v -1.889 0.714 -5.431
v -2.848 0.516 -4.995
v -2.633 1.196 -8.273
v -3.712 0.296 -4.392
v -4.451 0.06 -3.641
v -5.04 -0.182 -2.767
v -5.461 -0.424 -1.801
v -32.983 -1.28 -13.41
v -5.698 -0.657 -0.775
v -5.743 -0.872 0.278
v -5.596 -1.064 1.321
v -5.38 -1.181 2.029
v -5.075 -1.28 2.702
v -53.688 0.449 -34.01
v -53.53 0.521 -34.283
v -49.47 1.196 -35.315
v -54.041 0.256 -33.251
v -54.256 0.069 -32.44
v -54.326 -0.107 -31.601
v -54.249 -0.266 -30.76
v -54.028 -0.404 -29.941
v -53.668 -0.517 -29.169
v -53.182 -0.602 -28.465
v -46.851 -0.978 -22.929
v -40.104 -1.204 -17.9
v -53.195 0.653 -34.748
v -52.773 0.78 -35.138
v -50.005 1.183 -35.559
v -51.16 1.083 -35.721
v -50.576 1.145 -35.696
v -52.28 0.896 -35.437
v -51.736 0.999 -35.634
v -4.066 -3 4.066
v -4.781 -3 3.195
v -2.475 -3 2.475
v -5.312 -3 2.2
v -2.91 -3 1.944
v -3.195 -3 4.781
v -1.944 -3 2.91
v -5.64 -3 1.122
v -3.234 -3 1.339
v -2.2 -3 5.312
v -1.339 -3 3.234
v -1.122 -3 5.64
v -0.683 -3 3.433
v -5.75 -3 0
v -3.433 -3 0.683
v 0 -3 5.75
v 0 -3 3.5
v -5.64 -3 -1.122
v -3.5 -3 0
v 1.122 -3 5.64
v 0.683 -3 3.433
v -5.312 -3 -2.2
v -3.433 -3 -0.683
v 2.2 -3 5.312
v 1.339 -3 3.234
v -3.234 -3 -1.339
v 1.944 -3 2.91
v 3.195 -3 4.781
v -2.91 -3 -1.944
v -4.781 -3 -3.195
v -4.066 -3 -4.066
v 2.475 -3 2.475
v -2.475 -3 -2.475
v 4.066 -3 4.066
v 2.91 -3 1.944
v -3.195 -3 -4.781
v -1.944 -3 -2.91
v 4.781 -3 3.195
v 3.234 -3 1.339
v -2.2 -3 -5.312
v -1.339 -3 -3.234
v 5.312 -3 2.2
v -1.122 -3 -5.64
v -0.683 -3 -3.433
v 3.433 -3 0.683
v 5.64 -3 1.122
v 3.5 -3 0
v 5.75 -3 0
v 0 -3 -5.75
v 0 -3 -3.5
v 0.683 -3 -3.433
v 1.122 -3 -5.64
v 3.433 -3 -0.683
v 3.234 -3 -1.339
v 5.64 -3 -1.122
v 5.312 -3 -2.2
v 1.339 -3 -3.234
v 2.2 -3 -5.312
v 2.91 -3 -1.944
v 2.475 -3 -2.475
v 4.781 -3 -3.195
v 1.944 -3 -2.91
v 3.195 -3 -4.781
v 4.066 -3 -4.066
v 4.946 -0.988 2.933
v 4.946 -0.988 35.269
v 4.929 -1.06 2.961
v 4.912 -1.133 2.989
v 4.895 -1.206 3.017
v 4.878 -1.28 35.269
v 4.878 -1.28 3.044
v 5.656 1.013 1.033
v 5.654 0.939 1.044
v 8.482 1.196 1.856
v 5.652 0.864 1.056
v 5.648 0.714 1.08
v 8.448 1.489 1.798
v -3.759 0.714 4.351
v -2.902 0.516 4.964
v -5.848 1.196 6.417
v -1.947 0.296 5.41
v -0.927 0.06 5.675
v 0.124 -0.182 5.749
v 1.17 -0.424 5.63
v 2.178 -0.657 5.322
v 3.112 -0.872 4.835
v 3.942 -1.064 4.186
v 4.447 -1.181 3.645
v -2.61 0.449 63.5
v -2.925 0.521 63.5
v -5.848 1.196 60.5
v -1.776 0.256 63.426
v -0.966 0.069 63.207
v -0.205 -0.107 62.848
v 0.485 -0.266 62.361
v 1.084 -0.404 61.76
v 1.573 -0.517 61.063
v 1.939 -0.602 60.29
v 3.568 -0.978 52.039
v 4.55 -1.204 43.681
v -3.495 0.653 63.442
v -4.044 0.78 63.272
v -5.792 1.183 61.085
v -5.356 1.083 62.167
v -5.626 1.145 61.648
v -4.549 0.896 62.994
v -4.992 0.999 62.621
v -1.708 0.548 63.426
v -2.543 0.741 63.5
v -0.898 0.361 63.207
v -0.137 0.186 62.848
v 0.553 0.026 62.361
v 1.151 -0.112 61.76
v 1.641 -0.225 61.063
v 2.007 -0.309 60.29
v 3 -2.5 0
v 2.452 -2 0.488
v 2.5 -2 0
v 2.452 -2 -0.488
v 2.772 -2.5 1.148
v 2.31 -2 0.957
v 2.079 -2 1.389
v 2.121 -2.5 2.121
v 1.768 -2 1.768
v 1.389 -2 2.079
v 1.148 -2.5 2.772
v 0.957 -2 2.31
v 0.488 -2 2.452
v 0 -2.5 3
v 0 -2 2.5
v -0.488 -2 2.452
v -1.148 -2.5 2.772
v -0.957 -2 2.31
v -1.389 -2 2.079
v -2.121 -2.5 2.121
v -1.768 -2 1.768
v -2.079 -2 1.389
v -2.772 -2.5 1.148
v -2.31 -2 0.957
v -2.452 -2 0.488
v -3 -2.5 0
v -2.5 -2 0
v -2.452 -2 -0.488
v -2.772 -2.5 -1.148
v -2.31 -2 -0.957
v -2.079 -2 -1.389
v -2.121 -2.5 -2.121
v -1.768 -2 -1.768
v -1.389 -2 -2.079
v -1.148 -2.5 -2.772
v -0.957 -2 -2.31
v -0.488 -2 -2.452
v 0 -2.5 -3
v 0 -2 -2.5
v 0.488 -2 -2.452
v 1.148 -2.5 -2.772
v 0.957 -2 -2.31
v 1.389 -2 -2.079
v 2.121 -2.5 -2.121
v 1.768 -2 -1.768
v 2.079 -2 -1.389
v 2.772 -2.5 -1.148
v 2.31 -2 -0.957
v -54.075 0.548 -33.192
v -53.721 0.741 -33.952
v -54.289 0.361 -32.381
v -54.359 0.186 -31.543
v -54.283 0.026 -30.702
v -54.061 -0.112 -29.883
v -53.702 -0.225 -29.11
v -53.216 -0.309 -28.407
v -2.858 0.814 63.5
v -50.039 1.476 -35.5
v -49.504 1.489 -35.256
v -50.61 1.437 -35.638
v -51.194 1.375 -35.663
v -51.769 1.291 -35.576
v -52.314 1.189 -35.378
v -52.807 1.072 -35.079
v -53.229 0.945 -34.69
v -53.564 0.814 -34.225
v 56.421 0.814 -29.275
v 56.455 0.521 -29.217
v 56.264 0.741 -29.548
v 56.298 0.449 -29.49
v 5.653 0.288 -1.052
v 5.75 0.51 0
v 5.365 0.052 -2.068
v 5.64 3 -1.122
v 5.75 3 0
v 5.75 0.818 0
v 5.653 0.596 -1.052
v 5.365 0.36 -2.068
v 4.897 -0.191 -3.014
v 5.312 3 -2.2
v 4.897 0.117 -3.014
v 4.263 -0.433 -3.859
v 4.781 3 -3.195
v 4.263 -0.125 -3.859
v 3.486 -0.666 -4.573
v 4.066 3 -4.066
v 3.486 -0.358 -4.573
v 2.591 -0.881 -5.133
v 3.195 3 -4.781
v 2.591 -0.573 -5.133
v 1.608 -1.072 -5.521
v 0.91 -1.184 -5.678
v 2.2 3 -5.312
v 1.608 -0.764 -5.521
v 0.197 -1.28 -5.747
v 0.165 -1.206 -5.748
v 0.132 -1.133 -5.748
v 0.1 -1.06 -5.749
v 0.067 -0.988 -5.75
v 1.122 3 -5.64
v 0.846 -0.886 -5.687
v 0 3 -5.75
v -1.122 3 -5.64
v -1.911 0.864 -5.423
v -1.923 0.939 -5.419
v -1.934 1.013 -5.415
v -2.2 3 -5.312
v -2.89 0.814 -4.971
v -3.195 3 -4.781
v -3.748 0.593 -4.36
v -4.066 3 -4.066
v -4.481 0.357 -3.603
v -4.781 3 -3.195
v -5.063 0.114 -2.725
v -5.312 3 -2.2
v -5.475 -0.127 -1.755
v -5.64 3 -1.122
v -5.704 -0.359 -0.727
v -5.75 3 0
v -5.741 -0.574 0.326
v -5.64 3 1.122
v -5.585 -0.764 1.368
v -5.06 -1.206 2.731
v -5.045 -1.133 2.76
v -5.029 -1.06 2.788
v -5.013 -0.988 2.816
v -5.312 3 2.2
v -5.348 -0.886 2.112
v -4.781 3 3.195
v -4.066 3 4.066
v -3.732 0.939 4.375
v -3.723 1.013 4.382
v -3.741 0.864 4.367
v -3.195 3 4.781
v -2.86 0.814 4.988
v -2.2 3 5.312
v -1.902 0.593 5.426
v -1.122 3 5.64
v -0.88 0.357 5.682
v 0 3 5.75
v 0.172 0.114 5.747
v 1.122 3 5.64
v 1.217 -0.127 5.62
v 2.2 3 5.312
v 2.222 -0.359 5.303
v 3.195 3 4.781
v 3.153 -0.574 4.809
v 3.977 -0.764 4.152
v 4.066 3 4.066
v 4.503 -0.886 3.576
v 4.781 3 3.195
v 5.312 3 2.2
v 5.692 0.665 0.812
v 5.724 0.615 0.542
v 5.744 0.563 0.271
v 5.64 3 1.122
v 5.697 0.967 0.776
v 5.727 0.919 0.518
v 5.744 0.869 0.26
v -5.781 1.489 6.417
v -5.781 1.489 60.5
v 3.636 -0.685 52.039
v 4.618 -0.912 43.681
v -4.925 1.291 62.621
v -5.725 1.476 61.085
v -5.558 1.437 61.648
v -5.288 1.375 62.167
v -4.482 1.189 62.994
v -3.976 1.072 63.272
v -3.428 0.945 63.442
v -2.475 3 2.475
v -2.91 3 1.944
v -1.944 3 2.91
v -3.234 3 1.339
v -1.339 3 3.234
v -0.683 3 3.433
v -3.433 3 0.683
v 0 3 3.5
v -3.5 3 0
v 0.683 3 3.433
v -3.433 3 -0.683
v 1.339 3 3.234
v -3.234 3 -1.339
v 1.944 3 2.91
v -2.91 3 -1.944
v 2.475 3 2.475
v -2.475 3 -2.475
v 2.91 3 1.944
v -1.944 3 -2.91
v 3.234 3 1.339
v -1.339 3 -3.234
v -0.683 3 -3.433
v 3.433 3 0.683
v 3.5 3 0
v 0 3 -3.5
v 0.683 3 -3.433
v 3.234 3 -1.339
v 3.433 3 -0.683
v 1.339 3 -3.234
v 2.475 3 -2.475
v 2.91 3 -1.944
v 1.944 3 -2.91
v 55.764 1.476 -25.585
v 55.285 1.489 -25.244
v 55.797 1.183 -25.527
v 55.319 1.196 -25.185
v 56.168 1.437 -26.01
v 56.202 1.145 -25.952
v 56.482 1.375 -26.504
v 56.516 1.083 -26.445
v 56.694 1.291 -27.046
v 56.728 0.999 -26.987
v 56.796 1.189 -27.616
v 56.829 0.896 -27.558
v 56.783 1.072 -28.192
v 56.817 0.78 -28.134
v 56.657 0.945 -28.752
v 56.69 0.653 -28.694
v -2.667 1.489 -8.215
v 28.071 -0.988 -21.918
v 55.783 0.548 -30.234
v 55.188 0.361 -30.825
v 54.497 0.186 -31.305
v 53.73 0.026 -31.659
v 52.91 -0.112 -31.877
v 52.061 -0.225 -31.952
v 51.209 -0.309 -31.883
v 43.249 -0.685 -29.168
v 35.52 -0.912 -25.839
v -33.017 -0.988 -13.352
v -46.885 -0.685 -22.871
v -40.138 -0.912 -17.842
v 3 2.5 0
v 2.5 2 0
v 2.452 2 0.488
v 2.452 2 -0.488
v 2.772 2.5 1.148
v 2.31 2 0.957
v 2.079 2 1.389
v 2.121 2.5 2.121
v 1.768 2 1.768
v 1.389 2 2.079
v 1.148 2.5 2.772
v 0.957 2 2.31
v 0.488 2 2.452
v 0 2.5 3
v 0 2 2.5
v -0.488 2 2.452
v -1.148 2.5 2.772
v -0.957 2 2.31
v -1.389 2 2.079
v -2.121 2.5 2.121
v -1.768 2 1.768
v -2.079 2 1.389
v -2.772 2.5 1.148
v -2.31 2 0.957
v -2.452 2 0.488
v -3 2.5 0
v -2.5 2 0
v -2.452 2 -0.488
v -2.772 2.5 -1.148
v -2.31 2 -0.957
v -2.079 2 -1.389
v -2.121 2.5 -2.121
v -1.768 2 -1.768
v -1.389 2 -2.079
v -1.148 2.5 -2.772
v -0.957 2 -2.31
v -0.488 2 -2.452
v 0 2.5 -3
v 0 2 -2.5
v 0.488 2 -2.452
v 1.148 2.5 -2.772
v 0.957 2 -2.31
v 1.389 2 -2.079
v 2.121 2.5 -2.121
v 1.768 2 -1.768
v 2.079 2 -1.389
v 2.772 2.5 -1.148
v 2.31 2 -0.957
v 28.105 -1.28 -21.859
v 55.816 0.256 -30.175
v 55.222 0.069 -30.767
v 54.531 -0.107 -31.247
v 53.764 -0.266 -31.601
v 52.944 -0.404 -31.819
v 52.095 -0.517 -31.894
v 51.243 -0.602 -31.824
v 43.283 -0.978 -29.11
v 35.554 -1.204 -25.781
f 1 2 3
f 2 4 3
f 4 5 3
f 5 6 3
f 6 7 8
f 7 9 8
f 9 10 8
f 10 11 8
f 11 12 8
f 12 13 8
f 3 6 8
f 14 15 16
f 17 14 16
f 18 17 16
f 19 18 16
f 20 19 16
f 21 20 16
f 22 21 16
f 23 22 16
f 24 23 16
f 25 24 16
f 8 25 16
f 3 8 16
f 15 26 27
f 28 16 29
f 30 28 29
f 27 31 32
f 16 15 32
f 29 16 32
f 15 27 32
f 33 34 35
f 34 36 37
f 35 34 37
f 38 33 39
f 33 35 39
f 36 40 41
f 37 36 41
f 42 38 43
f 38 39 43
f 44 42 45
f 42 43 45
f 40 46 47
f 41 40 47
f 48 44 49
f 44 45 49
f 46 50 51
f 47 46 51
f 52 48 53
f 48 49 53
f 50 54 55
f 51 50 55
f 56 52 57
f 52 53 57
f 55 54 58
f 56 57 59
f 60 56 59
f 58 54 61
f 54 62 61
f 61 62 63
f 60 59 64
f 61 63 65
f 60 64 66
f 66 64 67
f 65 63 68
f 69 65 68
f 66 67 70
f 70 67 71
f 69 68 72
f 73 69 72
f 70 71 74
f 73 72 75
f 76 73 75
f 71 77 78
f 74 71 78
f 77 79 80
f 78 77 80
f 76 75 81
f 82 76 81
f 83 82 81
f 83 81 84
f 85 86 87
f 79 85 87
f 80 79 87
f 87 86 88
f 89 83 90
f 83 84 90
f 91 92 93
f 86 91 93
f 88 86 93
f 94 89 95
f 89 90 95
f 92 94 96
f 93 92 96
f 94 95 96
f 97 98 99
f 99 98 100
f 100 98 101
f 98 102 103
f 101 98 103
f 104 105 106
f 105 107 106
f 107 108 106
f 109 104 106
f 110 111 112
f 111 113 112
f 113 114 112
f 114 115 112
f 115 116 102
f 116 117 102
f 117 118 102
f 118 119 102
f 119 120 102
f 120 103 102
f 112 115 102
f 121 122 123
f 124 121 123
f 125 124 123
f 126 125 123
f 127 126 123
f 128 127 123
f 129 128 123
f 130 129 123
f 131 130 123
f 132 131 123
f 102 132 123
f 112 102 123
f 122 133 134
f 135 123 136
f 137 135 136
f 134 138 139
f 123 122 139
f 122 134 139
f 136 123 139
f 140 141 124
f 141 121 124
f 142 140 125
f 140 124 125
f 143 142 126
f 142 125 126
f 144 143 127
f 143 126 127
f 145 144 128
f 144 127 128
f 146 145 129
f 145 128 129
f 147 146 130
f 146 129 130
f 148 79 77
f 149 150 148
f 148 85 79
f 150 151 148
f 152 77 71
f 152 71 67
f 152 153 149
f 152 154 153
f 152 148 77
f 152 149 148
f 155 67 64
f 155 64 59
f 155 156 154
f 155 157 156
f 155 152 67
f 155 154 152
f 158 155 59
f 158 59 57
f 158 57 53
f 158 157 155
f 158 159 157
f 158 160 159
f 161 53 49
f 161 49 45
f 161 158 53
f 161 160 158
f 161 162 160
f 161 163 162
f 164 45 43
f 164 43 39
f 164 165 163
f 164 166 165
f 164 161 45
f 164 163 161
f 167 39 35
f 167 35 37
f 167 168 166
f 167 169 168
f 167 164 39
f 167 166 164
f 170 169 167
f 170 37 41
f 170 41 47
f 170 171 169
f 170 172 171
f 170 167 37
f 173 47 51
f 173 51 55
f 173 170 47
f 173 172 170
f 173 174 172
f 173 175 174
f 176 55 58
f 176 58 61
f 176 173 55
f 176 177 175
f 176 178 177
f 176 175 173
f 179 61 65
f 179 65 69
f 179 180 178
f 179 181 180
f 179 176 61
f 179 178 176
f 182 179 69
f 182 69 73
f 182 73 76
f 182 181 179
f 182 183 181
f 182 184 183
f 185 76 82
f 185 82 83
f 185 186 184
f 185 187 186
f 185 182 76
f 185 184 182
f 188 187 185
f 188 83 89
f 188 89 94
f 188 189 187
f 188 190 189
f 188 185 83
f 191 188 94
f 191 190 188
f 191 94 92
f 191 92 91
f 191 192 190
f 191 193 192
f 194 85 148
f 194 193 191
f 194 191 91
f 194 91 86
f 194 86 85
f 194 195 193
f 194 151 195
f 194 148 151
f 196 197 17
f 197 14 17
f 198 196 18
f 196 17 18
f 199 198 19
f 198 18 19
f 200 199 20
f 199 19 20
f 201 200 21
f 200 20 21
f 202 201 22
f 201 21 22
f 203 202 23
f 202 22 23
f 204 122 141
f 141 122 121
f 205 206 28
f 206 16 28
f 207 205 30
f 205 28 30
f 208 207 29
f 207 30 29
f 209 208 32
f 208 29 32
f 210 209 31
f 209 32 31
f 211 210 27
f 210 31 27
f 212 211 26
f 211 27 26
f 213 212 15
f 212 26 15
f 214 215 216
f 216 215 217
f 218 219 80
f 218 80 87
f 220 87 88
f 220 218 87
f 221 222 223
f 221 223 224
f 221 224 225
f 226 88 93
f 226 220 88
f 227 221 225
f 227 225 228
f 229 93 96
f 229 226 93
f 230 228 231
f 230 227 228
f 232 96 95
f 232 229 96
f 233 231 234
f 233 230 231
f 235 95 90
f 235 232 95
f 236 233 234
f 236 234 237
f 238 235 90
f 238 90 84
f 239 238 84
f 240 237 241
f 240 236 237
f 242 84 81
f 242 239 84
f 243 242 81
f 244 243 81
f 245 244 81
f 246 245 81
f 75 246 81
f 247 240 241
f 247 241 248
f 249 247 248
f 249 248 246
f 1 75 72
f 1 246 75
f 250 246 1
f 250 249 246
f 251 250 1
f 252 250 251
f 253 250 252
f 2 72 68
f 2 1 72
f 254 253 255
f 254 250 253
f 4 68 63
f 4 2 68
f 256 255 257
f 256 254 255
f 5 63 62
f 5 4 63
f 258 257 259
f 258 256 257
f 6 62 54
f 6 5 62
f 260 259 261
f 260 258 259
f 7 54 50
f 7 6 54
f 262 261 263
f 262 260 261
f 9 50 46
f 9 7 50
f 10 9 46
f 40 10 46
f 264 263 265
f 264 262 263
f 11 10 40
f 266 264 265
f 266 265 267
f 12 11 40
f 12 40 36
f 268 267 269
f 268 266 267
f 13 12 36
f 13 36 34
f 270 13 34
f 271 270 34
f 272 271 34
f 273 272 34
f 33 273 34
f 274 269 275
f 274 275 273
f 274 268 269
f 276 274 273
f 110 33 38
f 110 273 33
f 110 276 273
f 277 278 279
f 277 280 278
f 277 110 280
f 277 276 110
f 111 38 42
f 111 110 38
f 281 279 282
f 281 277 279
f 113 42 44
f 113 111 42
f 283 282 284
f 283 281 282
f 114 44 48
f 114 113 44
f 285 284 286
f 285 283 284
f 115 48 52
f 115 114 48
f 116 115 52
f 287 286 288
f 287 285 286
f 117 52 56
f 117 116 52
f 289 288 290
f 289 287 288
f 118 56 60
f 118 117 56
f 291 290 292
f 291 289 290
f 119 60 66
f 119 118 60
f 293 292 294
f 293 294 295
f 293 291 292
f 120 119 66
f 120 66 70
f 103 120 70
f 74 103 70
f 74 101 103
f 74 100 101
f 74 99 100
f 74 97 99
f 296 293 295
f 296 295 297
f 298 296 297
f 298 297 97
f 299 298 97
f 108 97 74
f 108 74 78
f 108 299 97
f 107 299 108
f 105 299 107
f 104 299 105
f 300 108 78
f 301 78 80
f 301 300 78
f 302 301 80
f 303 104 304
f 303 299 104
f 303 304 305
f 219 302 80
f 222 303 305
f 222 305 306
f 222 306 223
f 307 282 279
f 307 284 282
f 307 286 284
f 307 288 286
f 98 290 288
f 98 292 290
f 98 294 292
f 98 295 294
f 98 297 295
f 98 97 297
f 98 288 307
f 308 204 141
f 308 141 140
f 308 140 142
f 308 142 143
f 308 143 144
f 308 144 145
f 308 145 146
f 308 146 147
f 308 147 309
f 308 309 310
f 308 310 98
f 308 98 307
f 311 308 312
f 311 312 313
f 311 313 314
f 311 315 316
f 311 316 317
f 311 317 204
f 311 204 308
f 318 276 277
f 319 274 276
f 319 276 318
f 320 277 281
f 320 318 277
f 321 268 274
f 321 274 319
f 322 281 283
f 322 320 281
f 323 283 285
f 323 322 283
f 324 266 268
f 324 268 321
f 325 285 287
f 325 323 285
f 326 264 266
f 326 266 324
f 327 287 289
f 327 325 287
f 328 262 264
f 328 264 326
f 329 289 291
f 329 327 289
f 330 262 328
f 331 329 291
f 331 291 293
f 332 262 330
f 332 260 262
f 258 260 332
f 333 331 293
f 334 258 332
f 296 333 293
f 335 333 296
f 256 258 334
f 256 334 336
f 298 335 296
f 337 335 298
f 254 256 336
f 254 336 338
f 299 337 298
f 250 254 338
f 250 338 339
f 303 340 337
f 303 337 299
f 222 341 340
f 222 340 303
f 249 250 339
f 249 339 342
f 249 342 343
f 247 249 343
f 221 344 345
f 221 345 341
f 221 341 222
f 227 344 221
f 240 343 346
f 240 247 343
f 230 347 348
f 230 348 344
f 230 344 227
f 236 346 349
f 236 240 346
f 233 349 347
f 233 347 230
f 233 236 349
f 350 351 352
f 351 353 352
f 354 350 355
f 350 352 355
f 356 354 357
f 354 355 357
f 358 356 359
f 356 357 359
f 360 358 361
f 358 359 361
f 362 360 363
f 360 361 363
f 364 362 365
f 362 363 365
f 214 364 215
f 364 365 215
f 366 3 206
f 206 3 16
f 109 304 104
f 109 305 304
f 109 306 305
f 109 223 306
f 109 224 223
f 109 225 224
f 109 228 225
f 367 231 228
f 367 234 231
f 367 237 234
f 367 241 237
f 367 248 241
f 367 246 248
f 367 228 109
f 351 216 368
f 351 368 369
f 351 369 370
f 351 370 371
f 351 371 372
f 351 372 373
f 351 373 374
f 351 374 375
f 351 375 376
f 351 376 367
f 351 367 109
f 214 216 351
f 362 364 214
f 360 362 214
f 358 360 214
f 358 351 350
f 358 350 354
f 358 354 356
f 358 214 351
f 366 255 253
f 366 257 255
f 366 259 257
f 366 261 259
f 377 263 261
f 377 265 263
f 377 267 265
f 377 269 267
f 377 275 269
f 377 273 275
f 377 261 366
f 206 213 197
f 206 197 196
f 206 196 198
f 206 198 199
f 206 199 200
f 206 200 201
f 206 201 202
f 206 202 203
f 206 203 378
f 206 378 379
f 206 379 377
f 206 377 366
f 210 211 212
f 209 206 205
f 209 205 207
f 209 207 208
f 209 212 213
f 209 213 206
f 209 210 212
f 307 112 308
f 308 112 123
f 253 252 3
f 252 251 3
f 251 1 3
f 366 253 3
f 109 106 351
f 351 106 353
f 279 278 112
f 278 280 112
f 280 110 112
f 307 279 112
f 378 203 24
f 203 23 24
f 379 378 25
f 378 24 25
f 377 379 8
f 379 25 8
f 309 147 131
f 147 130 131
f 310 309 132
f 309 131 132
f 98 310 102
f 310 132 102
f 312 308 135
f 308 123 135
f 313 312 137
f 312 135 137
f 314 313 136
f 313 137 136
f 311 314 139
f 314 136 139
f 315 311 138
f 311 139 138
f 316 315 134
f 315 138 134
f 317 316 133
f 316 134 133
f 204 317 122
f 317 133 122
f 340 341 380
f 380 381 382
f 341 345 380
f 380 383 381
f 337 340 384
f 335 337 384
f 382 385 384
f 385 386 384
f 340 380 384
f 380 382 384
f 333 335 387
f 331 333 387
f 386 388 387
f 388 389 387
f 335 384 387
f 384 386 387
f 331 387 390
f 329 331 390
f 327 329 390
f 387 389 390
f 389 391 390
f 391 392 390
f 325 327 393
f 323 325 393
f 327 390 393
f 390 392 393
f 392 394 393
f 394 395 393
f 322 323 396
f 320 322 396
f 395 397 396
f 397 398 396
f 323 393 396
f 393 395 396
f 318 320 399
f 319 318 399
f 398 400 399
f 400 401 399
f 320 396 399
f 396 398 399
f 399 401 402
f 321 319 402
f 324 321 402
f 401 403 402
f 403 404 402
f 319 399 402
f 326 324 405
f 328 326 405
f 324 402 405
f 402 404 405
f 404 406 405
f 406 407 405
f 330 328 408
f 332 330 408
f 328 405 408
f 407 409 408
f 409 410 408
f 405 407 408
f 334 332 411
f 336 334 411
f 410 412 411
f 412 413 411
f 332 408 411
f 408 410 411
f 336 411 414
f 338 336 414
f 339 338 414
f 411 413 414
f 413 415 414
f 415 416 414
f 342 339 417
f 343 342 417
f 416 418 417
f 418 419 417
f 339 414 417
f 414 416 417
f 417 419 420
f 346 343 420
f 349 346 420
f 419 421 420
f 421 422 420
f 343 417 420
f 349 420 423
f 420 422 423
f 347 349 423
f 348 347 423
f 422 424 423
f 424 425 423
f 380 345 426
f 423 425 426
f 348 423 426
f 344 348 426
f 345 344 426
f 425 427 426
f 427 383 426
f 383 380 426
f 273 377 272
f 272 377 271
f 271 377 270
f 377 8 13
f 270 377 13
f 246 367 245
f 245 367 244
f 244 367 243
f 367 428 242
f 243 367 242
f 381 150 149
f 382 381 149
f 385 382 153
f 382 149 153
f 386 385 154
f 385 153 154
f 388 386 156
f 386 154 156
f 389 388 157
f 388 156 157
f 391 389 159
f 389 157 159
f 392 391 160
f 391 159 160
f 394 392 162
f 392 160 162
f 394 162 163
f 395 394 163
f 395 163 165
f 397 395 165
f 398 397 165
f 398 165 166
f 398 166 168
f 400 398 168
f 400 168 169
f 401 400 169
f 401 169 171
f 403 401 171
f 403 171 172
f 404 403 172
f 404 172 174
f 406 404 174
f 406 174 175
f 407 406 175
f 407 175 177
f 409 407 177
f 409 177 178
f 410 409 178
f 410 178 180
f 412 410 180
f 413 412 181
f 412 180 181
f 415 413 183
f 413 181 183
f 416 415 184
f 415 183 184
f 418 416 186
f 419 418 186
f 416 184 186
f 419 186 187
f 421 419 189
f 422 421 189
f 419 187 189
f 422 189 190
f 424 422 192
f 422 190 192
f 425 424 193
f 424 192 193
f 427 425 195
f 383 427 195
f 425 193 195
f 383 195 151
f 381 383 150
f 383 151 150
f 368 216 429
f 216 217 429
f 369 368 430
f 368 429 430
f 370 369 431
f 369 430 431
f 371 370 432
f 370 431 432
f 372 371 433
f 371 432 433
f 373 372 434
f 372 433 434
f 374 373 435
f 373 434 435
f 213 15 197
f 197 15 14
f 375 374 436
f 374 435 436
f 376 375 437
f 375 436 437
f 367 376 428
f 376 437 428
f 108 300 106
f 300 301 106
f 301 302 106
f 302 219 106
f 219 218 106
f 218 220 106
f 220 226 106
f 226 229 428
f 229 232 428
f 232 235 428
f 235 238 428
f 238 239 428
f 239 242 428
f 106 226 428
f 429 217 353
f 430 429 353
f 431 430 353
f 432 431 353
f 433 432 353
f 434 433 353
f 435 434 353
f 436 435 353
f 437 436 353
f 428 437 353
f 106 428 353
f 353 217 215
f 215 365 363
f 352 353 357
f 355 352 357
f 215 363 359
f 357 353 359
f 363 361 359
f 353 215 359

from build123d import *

# Parameters (mm, degrees)
SKETCH1_R           = 5.75
BOSS_EXTRUDE1_DEPTH = 3
BOSS_EXTRUDE2_DEPTH = 0.15
CIRPATTERN1_COUNT   = 3
SKETCH4_R           = 2.5
CUT_EXTRUDE1_DEPTH  = 7
CHAMFER1_SIZE       = 1


with BuildPart() as part:
    # Sketch1 → Boss-Extrude1 (new body, symmetric)
    with BuildSketch(Plane(origin=(0, 0, 0), x_dir=(1, 0, 0), z_dir=(0, 1, 0))):
        Circle(SKETCH1_R)
    extrude(amount=BOSS_EXTRUDE1_DEPTH, both=True)

    # Sketch3 → Boss-Extrude2 (add, symmetric)
    with BuildSketch(Plane(origin=(0, 0, 0), x_dir=(0.974370065, -0.224951054, 0), z_dir=(-0.224951054, -0.974370065, 0))):
        with BuildLine():
            Line((-3.401230627, 3.94493197), (-5.967495519, 6.417230684))
            Line((-5.967495519, 6.417230684), (-5.967495519, 60.5))
            ThreePointArc((-5.967495519, 60.5), (-5.088815862, 62.621320344), (-2.967495519, 63.5))
            Line((-2.967495519, 63.5), (-2.64407202, 63.5))
            ThreePointArc((-2.64407202, 63.5), (0.188980824, 62.61992859), (2.024718143, 60.289524634))
            ThreePointArc((2.024718143, 60.289524634), (4.284220879, 47.869969205), (5.041015214, 35.26925605))
            Line((5.041015214, 35.26925605), (5.041015214, 1.396310084))
            add(Edge.make_bspline(
                [(-3.401230627, 3.94493197), (1.650654294, 7.536977948), (5.041015214, 1.396310084)],
                knots=[0, 0, 0, 1, 1, 1], degree=2))
        make_face()
    boss_extrude2 = extrude(amount=BOSS_EXTRUDE2_DEPTH, both=True)

    # CirPattern1: Boss-Extrude2 ×3 about axis
    cirpattern1_axis = Axis((0, 0, 0), (0, 1, 0))
    for i in range(1, CIRPATTERN1_COUNT):
        add(boss_extrude2.rotate(cirpattern1_axis, i * 360 / CIRPATTERN1_COUNT))

    # Sketch4 → Cut-Extrude1 (cut, through all)
    with BuildSketch(Plane.XZ.offset(3)):
        Circle(SKETCH4_R)
    extrude(amount=-CUT_EXTRUDE1_DEPTH, mode=Mode.SUBTRACT)

    # Chamfer1
    chamfer1_edges = [part.edges().sort_by_distance(p)[0] for p in [
        (-2.5, 3, 0),
        (-2.5, -3, 0),
    ]]
    chamfer(chamfer1_edges, length=CHAMFER1_SIZE)


solid = part.part
